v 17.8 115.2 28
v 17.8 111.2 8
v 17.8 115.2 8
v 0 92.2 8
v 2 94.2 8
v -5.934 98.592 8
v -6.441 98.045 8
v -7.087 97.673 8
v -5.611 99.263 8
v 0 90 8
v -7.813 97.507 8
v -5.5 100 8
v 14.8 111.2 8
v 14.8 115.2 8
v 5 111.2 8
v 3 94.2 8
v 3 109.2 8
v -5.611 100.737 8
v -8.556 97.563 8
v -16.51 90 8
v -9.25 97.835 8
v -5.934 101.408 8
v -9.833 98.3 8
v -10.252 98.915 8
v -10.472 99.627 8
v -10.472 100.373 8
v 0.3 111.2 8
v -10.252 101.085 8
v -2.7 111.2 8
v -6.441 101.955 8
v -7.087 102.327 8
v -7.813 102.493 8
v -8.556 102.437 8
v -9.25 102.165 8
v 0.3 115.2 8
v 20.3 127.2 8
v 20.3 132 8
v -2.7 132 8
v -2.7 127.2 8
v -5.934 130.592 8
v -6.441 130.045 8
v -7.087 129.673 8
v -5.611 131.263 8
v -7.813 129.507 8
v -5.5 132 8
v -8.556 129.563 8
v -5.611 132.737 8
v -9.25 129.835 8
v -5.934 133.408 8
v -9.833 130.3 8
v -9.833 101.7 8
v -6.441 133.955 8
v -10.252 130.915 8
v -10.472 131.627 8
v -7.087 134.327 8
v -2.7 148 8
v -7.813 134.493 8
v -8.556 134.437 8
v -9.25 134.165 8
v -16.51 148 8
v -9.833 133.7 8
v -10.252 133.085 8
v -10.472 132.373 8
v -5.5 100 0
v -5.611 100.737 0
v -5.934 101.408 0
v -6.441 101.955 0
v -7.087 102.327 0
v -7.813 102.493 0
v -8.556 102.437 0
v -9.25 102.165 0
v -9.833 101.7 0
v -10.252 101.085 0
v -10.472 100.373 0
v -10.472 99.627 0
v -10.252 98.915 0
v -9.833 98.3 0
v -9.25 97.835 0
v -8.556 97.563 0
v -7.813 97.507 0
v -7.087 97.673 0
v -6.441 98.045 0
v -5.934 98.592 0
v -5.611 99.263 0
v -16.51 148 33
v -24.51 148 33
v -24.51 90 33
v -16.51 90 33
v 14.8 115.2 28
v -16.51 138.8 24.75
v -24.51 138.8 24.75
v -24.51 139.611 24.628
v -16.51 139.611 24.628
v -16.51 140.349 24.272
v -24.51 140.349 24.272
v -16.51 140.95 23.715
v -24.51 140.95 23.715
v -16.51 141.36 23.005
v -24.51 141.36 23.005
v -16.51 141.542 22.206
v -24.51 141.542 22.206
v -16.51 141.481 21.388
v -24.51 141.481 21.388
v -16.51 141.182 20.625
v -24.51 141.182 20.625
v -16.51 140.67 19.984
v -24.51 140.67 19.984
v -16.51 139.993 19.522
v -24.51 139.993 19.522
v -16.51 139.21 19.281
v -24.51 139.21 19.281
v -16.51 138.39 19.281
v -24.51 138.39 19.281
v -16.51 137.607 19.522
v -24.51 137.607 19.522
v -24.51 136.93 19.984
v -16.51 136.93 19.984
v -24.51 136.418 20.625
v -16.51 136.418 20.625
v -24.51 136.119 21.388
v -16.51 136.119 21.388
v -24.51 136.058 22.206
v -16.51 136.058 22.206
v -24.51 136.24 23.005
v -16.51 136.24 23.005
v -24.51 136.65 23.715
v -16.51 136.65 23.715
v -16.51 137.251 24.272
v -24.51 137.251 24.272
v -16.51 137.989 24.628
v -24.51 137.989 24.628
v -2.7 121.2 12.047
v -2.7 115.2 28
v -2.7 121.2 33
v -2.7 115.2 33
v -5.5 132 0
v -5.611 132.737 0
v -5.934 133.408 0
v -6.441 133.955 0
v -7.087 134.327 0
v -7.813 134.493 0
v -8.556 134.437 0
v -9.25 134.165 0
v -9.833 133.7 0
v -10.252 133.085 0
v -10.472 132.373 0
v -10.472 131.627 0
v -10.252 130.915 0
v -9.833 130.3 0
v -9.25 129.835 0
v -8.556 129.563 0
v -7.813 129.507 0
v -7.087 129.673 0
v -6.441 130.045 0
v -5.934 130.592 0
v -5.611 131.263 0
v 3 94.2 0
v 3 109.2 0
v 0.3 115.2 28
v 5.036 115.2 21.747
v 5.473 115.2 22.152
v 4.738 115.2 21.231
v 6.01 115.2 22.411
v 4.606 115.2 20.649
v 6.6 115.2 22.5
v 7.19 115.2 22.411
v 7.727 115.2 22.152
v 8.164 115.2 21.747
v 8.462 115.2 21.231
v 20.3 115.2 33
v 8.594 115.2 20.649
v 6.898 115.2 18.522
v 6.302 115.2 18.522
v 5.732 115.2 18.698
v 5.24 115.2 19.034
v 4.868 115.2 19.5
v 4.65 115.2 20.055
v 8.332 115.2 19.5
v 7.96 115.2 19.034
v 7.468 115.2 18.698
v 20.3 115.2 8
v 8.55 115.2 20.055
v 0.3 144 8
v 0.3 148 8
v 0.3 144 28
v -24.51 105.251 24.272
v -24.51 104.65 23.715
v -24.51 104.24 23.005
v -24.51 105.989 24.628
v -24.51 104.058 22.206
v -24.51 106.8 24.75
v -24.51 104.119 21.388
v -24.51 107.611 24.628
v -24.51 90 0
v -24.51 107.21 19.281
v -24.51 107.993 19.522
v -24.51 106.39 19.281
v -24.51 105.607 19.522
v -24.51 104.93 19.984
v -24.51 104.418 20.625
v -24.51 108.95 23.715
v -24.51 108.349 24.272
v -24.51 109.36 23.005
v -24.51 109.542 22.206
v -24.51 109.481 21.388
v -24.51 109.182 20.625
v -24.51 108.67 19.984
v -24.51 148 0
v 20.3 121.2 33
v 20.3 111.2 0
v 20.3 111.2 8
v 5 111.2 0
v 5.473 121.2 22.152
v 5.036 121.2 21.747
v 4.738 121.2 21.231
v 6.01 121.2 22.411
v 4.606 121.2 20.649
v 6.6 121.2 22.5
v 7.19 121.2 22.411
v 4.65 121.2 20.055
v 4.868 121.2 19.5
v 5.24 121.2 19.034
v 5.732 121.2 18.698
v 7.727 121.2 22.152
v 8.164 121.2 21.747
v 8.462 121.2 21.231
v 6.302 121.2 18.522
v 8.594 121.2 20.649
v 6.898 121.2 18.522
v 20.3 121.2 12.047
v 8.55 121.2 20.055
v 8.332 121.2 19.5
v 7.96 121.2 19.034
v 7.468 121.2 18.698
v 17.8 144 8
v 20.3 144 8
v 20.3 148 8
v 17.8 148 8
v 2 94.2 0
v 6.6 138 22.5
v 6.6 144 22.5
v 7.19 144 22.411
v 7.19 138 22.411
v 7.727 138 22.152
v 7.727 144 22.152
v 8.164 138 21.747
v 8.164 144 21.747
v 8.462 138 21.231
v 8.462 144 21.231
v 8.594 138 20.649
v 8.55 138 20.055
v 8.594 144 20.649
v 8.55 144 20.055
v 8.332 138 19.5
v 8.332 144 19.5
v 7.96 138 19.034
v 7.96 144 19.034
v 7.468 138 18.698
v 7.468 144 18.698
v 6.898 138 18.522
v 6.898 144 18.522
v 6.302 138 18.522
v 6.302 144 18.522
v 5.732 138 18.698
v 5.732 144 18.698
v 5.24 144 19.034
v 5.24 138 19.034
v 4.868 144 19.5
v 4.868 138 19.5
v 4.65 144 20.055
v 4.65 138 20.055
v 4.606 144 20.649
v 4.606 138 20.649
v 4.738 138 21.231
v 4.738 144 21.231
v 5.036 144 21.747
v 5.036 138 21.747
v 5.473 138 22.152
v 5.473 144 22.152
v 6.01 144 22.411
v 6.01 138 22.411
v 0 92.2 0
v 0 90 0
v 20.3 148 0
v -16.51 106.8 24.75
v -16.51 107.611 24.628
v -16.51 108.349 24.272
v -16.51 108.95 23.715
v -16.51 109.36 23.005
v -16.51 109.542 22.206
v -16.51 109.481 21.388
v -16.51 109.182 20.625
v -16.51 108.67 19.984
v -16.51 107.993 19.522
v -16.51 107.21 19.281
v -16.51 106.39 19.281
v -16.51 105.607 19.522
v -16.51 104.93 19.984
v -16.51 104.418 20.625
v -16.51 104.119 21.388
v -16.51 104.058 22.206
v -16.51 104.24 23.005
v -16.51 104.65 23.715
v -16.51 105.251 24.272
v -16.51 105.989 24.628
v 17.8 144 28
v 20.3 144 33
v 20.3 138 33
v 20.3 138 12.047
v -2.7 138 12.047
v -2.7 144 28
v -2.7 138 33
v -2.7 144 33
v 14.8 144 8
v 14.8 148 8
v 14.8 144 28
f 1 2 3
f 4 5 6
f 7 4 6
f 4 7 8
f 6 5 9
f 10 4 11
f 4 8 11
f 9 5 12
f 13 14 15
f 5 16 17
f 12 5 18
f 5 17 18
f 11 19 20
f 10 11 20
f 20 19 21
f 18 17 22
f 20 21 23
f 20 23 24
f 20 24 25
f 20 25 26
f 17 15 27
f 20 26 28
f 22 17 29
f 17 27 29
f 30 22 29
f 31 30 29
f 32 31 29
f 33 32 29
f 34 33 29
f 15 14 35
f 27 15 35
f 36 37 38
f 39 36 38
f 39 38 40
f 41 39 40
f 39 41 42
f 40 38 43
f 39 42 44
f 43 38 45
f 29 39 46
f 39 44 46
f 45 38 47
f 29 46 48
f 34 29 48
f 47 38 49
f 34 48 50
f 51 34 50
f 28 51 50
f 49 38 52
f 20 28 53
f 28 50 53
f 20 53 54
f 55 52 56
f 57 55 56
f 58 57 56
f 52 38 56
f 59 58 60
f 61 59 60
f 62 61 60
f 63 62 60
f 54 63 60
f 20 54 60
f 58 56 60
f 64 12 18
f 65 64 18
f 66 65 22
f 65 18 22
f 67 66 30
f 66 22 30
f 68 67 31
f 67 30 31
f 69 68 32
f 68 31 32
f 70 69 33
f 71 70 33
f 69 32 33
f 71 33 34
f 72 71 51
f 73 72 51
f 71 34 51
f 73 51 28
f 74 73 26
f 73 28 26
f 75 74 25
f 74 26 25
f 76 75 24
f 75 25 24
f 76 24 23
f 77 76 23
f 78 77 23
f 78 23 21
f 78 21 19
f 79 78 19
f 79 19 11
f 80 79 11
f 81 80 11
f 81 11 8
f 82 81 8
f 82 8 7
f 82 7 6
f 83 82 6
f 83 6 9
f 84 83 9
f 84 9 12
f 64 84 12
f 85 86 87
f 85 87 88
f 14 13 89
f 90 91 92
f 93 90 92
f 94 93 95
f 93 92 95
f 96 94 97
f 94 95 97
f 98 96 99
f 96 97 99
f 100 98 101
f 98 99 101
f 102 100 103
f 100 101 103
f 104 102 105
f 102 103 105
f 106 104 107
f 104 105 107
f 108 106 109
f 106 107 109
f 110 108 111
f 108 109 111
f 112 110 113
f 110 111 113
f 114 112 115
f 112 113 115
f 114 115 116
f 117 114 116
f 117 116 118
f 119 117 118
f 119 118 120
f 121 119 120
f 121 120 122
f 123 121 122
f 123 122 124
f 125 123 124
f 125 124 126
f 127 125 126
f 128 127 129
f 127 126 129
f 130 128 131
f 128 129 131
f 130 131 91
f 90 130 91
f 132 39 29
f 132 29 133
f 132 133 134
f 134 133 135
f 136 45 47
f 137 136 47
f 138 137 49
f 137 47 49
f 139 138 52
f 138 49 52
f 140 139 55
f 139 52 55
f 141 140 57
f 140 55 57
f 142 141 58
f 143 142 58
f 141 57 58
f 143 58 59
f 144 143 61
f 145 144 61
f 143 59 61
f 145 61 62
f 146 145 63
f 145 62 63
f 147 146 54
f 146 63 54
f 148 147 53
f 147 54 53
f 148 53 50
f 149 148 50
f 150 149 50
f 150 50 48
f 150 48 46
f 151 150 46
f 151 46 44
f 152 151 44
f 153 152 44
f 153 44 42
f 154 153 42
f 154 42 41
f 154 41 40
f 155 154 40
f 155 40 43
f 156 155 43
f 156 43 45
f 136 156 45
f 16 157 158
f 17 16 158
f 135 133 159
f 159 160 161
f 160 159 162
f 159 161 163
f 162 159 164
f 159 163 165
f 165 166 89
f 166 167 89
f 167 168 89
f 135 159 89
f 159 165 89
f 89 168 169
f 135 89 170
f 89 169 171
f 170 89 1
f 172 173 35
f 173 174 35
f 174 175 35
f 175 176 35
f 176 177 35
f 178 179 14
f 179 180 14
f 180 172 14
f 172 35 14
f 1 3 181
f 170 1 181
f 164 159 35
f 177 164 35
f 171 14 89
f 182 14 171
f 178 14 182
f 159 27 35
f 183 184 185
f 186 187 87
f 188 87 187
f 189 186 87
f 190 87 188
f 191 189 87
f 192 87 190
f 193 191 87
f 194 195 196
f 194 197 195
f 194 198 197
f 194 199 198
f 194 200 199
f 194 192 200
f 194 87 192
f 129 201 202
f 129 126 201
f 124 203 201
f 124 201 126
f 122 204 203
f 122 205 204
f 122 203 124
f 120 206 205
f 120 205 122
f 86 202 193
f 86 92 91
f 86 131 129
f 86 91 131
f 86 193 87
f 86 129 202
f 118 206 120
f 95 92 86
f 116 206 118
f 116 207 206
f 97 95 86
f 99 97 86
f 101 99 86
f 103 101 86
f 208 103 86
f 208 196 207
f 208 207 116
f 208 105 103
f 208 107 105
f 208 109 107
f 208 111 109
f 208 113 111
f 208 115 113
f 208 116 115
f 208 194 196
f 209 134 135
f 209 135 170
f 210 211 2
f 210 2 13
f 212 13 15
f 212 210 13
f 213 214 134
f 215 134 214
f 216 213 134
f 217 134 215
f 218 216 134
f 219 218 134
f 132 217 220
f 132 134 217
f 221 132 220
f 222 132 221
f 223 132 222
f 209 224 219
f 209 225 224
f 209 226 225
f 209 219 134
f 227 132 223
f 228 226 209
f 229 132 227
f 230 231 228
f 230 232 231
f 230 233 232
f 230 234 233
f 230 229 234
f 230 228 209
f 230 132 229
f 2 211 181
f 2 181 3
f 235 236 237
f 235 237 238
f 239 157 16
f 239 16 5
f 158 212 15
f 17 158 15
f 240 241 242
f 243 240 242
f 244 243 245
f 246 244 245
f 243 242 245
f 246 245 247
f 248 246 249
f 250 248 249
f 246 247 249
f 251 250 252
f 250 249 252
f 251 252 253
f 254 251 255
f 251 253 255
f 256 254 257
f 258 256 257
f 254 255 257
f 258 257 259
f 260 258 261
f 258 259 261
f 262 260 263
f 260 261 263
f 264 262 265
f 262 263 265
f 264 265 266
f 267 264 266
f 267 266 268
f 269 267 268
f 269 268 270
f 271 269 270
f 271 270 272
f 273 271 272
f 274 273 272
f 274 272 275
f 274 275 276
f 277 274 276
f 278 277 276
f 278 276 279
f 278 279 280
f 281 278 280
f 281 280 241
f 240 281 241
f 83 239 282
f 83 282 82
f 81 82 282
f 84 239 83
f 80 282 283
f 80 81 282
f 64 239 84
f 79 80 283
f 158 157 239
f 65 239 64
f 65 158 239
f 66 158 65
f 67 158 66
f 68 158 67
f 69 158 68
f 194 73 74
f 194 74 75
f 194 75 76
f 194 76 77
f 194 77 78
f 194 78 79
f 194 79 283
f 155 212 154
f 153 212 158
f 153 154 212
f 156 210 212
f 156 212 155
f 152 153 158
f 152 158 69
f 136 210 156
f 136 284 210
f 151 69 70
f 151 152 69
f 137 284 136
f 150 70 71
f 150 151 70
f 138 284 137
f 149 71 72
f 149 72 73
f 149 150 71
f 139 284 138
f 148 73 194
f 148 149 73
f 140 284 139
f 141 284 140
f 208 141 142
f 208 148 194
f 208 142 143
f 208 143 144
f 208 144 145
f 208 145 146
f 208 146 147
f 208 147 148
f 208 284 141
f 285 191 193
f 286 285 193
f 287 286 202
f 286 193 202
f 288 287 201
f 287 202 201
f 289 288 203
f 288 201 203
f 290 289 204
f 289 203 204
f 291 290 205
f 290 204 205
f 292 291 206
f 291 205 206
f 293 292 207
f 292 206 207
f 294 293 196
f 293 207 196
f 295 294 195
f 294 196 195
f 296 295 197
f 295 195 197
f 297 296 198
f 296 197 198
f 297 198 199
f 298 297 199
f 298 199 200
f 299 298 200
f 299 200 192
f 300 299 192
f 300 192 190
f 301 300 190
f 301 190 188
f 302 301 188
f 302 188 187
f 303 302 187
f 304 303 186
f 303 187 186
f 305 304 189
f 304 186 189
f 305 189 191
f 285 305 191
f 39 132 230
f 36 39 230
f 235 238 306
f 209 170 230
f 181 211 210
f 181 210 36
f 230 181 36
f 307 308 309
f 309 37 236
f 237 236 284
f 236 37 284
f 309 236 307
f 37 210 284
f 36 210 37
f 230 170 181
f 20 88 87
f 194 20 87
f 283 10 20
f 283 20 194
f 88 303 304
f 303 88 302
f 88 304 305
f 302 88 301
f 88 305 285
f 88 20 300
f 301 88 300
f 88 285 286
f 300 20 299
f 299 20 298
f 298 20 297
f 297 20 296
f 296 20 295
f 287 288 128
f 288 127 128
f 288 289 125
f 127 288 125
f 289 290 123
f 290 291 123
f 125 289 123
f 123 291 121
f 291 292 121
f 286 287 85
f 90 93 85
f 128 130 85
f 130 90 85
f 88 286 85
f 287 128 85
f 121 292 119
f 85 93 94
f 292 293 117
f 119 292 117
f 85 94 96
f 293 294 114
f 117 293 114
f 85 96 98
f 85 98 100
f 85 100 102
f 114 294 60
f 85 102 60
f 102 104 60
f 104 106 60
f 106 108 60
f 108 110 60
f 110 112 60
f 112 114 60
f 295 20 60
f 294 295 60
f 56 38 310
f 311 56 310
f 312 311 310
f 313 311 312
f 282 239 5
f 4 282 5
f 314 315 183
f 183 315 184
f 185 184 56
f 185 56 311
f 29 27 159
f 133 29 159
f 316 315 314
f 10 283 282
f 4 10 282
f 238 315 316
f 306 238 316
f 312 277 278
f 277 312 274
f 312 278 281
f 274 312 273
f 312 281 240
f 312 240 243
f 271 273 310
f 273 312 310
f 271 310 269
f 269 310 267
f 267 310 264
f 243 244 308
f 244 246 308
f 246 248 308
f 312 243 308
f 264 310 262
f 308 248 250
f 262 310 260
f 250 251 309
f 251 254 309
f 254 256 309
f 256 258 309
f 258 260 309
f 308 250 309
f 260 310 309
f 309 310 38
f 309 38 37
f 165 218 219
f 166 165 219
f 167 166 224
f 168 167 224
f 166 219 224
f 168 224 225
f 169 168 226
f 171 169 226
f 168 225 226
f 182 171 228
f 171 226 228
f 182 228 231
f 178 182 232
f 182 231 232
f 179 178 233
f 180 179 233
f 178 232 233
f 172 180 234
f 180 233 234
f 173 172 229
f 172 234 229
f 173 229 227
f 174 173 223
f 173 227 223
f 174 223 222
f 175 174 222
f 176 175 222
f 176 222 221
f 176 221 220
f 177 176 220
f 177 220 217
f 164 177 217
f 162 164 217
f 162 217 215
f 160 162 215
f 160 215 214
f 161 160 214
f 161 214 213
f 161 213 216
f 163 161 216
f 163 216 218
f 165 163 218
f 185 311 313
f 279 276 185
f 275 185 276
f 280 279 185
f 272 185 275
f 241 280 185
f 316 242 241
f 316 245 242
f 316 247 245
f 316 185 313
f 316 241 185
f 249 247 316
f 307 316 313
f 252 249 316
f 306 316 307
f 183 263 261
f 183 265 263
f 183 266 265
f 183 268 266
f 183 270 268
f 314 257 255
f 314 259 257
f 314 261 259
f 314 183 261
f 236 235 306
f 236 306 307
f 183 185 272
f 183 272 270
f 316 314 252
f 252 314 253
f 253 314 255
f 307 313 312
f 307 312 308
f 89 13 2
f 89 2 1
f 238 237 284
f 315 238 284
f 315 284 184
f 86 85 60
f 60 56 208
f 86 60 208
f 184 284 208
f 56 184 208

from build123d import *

# Parameters (mm, degrees)
SKETCH1_W               = 24.51
SKETCH1_H               = 148
BOSS_EXTRUDE1_DEPTH     = 8
SKETCH2_W               = 8
SKETCH2_H               = 148
BOSS_EXTRUDE2_DEPTH     = 25
SKETCH4_W               = 20.3
SKETCH4_H               = 36.8
BOSS_EXTRUDE3_DEPTH     = 8
SKETCH5_W               = 23
SKETCH5_H               = 6
BOSS_EXTRUDE4_DEPTH     = 25
CUT_EXTRUDE2_REACH      = 151.752
SKETCH6_R               = 2
RIB1_REACH              = 159.03
SKETCH8_WALL_W          = 336.456302216
SKETCH8_WALL_H          = 3
MIRROR2_COPY_1_REACH    = 159.03
MIRROR2_COPY_1_SKETCH_W = 336.456302216
MIRROR2_COPY_1_SKETCH_H = 3
SKETCH3_R               = 2.5
CUT_EXTRUDE1_DEPTH      = 10
SKETCH12_R              = 2.75
CUT_EXTRUDE3_DEPTH      = 8
SKETCH13_W              = 5
SKETCH13_H              = 46
BOSS_EXTRUDE5_DEPTH     = 8
SKETCH14_W              = 3
SKETCH14_H              = 17
BOSS_EXTRUDE6_DEPTH     = 8
CHAMFER1_SIZE           = 2
CHAMFER2_SIZE           = 6
CHAMFER2_SIZE2          = 4.047051101
SKETCH15_W              = 33
SKETCH15_H              = 90
CUT_EXTRUDE4_DEPTH      = 48


with BuildPart() as part:
    # Sketch1 → Boss-Extrude1 (new body)
    with BuildSketch(Plane.XY):
        with Locations((-12.255, 74)):
            Rectangle(SKETCH1_W, SKETCH1_H)
    extrude(amount=BOSS_EXTRUDE1_DEPTH)

    # Sketch2 → Boss-Extrude2 (add)
    with BuildSketch(Plane.XY.offset(8)):
        with Locations((-20.51, 74)):
            Rectangle(SKETCH2_W, SKETCH2_H)
    extrude(amount=BOSS_EXTRUDE2_DEPTH)

    # Sketch4 → Boss-Extrude3 (add)
    with BuildSketch(Plane(origin=(0, 0, 0), x_dir=(-1, 0, 0), z_dir=(0, 0, -1))):
        with Locations((-10.15, 129.6)):
            Rectangle(SKETCH4_W, SKETCH4_H)
    extrude(amount=-BOSS_EXTRUDE3_DEPTH)

    # Sketch5 → Boss-Extrude4 (add)
    with BuildSketch(Plane.XY.offset(8)):
        with Locations((8.8, 118.2)):
            Rectangle(SKETCH5_W, SKETCH5_H)
        with Locations((8.8, 141)):
            Rectangle(SKETCH5_W, SKETCH5_H)
    extrude(amount=BOSS_EXTRUDE4_DEPTH)

    # Cut-Extrude2: up to this face of the body (flat: up to its plane)
    cut_extrude2_end = Plane(part.part.faces().sort_by_distance((8.8, 115.2, 20.5))[0])
    # Sketch6 → Cut-Extrude2 (cut, up to the picked face)
    with BuildSketch(Plane(origin=(0, 144, 0), x_dir=(1, 0, 0), z_dir=(0, 1, 0)), mode=Mode.PRIVATE) as cut_extrude2_sk1:
        with Locations(Location((6.6, -20.5, 0), (0, 0, 270))):
            Circle(SKETCH6_R)
    cut_extrude2_tool1 = split(extrude(cut_extrude2_sk1.sketch, amount=-CUT_EXTRUDE2_REACH, mode=Mode.PRIVATE), bisect_by=cut_extrude2_end, keep=Keep.BOTH, mode=Mode.PRIVATE)
    add(cut_extrude2_tool1.solids().sort_by(Axis((6.6, 144, 20.5), (0, -1, 0)))[0], mode=Mode.SUBTRACT)

    # Sketch8 wall → Rib1 (add, up to next)
    with BuildSketch(Plane(origin=(16.3, 146, 18), x_dir=(0, -0.196116135138, 0.980580675691), z_dir=(0, -0.980580675691, -0.196116135138)), mode=Mode.PRIVATE) as rib1_sk1:
        Rectangle(SKETCH8_WALL_W, SKETCH8_WALL_H)
    rib1_tool1 = extrude(rib1_sk1.sketch, amount=RIB1_REACH, mode=Mode.PRIVATE) - part.part
    rib1 = rib1_tool1.solids().sort_by_distance((16.3, 146, 18))[0]
    add(rib1)

    # Mirror1: Rib1 across plane
    add(rib1.mirror(Plane.ZX.offset(129.6)))

    # Mirror2: Rib1 across plane
    add(rib1.mirror(Plane.ZY.offset(-7.55)))

    # Mirror2 copy 1 sketch → Mirror2 copy 1 (add, up to next)
    with BuildSketch(Plane(origin=(-1.2, 113.2, 18), x_dir=(0, 0.196116135138, 0.980580675691), z_dir=(0, 0.980580675691, -0.196116135138)), mode=Mode.PRIVATE) as mirror2_copy_1_sk1:
        Rectangle(MIRROR2_COPY_1_SKETCH_W, MIRROR2_COPY_1_SKETCH_H)
    mirror2_copy_1_tool1 = extrude(mirror2_copy_1_sk1.sketch, amount=MIRROR2_COPY_1_REACH, mode=Mode.PRIVATE) - part.part
    add(mirror2_copy_1_tool1.solids().sort_by_distance((-1.2, 113.2, 18))[0])

    # Sketch3 → Cut-Extrude1 (cut)
    with BuildSketch(Plane.XY.offset(8)):
        with Locations((-8, 8)):
            Circle(SKETCH3_R)
        with Locations((-8, 40)):
            Circle(SKETCH3_R)
        with Locations((-8, 100)):
            Circle(SKETCH3_R)
        with Locations((-8, 132)):
            Circle(SKETCH3_R)
    extrude(amount=-CUT_EXTRUDE1_DEPTH, mode=Mode.SUBTRACT)

    # Sketch12 → Cut-Extrude3 (cut)
    with BuildSketch(Plane.ZY.offset(24.51)):
        with Locations((22, 138.8)):
            Circle(SKETCH12_R)
        with Locations((22, 106.8)):
            Circle(SKETCH12_R)
        with Locations((22, 41.7)):
            Circle(SKETCH12_R)
        with Locations((22, 9.7)):
            Circle(SKETCH12_R)
    extrude(amount=-CUT_EXTRUDE3_DEPTH, mode=Mode.SUBTRACT)

    # Sketch13 → Boss-Extrude5 (add)
    with BuildSketch(Plane(origin=(0, 0, 0), x_dir=(-1, 0, 0), z_dir=(0, 0, -1))):
        with Locations((-2.5, 23)):
            Rectangle(SKETCH13_W, SKETCH13_H)
    extrude(amount=-BOSS_EXTRUDE5_DEPTH)

    # Sketch14 → Boss-Extrude6 (add)
    with BuildSketch(Plane(origin=(0, 0, 0), x_dir=(-1, 0, 0), z_dir=(0, 0, -1))):
        with Locations((-1.5, 102.7)):
            Rectangle(SKETCH14_W, SKETCH14_H)
    extrude(amount=-BOSS_EXTRUDE6_DEPTH)

    # Chamfer1
    chamfer1_edges = [part.edges().sort_by_distance(p)[0] for p in [
        (0, 46, 4),
        (3, 111.2, 4),
        (0, 94.2, 4),
    ]]
    chamfer(chamfer1_edges, length=CHAMFER1_SIZE)

    # Chamfer2
    chamfer2_edges = [part.edges().sort_by_distance(p)[0] for p in [
        (8.8, 121.2, 8),
        (8.8, 138, 8),
    ]]
    chamfer2_side = [part.faces().sort_by_distance(p)[0] for p in [
        (-4.974591741, 76.782250606, 8),
    ]]
    chamfer(chamfer2_edges, length=CHAMFER2_SIZE, length2=CHAMFER2_SIZE2, reference=chamfer2_side[0])

    # Sketch15 → Cut-Extrude4 (cut)
    with BuildSketch(Plane(origin=(20.3, 0, 0), x_dir=(0, 0, -1), z_dir=(1, 0, 0))):
        with Locations((-16.5, 45)):
            Rectangle(SKETCH15_W, SKETCH15_H)
    extrude(amount=-CUT_EXTRUDE4_DEPTH, mode=Mode.SUBTRACT)


solid = part.part
